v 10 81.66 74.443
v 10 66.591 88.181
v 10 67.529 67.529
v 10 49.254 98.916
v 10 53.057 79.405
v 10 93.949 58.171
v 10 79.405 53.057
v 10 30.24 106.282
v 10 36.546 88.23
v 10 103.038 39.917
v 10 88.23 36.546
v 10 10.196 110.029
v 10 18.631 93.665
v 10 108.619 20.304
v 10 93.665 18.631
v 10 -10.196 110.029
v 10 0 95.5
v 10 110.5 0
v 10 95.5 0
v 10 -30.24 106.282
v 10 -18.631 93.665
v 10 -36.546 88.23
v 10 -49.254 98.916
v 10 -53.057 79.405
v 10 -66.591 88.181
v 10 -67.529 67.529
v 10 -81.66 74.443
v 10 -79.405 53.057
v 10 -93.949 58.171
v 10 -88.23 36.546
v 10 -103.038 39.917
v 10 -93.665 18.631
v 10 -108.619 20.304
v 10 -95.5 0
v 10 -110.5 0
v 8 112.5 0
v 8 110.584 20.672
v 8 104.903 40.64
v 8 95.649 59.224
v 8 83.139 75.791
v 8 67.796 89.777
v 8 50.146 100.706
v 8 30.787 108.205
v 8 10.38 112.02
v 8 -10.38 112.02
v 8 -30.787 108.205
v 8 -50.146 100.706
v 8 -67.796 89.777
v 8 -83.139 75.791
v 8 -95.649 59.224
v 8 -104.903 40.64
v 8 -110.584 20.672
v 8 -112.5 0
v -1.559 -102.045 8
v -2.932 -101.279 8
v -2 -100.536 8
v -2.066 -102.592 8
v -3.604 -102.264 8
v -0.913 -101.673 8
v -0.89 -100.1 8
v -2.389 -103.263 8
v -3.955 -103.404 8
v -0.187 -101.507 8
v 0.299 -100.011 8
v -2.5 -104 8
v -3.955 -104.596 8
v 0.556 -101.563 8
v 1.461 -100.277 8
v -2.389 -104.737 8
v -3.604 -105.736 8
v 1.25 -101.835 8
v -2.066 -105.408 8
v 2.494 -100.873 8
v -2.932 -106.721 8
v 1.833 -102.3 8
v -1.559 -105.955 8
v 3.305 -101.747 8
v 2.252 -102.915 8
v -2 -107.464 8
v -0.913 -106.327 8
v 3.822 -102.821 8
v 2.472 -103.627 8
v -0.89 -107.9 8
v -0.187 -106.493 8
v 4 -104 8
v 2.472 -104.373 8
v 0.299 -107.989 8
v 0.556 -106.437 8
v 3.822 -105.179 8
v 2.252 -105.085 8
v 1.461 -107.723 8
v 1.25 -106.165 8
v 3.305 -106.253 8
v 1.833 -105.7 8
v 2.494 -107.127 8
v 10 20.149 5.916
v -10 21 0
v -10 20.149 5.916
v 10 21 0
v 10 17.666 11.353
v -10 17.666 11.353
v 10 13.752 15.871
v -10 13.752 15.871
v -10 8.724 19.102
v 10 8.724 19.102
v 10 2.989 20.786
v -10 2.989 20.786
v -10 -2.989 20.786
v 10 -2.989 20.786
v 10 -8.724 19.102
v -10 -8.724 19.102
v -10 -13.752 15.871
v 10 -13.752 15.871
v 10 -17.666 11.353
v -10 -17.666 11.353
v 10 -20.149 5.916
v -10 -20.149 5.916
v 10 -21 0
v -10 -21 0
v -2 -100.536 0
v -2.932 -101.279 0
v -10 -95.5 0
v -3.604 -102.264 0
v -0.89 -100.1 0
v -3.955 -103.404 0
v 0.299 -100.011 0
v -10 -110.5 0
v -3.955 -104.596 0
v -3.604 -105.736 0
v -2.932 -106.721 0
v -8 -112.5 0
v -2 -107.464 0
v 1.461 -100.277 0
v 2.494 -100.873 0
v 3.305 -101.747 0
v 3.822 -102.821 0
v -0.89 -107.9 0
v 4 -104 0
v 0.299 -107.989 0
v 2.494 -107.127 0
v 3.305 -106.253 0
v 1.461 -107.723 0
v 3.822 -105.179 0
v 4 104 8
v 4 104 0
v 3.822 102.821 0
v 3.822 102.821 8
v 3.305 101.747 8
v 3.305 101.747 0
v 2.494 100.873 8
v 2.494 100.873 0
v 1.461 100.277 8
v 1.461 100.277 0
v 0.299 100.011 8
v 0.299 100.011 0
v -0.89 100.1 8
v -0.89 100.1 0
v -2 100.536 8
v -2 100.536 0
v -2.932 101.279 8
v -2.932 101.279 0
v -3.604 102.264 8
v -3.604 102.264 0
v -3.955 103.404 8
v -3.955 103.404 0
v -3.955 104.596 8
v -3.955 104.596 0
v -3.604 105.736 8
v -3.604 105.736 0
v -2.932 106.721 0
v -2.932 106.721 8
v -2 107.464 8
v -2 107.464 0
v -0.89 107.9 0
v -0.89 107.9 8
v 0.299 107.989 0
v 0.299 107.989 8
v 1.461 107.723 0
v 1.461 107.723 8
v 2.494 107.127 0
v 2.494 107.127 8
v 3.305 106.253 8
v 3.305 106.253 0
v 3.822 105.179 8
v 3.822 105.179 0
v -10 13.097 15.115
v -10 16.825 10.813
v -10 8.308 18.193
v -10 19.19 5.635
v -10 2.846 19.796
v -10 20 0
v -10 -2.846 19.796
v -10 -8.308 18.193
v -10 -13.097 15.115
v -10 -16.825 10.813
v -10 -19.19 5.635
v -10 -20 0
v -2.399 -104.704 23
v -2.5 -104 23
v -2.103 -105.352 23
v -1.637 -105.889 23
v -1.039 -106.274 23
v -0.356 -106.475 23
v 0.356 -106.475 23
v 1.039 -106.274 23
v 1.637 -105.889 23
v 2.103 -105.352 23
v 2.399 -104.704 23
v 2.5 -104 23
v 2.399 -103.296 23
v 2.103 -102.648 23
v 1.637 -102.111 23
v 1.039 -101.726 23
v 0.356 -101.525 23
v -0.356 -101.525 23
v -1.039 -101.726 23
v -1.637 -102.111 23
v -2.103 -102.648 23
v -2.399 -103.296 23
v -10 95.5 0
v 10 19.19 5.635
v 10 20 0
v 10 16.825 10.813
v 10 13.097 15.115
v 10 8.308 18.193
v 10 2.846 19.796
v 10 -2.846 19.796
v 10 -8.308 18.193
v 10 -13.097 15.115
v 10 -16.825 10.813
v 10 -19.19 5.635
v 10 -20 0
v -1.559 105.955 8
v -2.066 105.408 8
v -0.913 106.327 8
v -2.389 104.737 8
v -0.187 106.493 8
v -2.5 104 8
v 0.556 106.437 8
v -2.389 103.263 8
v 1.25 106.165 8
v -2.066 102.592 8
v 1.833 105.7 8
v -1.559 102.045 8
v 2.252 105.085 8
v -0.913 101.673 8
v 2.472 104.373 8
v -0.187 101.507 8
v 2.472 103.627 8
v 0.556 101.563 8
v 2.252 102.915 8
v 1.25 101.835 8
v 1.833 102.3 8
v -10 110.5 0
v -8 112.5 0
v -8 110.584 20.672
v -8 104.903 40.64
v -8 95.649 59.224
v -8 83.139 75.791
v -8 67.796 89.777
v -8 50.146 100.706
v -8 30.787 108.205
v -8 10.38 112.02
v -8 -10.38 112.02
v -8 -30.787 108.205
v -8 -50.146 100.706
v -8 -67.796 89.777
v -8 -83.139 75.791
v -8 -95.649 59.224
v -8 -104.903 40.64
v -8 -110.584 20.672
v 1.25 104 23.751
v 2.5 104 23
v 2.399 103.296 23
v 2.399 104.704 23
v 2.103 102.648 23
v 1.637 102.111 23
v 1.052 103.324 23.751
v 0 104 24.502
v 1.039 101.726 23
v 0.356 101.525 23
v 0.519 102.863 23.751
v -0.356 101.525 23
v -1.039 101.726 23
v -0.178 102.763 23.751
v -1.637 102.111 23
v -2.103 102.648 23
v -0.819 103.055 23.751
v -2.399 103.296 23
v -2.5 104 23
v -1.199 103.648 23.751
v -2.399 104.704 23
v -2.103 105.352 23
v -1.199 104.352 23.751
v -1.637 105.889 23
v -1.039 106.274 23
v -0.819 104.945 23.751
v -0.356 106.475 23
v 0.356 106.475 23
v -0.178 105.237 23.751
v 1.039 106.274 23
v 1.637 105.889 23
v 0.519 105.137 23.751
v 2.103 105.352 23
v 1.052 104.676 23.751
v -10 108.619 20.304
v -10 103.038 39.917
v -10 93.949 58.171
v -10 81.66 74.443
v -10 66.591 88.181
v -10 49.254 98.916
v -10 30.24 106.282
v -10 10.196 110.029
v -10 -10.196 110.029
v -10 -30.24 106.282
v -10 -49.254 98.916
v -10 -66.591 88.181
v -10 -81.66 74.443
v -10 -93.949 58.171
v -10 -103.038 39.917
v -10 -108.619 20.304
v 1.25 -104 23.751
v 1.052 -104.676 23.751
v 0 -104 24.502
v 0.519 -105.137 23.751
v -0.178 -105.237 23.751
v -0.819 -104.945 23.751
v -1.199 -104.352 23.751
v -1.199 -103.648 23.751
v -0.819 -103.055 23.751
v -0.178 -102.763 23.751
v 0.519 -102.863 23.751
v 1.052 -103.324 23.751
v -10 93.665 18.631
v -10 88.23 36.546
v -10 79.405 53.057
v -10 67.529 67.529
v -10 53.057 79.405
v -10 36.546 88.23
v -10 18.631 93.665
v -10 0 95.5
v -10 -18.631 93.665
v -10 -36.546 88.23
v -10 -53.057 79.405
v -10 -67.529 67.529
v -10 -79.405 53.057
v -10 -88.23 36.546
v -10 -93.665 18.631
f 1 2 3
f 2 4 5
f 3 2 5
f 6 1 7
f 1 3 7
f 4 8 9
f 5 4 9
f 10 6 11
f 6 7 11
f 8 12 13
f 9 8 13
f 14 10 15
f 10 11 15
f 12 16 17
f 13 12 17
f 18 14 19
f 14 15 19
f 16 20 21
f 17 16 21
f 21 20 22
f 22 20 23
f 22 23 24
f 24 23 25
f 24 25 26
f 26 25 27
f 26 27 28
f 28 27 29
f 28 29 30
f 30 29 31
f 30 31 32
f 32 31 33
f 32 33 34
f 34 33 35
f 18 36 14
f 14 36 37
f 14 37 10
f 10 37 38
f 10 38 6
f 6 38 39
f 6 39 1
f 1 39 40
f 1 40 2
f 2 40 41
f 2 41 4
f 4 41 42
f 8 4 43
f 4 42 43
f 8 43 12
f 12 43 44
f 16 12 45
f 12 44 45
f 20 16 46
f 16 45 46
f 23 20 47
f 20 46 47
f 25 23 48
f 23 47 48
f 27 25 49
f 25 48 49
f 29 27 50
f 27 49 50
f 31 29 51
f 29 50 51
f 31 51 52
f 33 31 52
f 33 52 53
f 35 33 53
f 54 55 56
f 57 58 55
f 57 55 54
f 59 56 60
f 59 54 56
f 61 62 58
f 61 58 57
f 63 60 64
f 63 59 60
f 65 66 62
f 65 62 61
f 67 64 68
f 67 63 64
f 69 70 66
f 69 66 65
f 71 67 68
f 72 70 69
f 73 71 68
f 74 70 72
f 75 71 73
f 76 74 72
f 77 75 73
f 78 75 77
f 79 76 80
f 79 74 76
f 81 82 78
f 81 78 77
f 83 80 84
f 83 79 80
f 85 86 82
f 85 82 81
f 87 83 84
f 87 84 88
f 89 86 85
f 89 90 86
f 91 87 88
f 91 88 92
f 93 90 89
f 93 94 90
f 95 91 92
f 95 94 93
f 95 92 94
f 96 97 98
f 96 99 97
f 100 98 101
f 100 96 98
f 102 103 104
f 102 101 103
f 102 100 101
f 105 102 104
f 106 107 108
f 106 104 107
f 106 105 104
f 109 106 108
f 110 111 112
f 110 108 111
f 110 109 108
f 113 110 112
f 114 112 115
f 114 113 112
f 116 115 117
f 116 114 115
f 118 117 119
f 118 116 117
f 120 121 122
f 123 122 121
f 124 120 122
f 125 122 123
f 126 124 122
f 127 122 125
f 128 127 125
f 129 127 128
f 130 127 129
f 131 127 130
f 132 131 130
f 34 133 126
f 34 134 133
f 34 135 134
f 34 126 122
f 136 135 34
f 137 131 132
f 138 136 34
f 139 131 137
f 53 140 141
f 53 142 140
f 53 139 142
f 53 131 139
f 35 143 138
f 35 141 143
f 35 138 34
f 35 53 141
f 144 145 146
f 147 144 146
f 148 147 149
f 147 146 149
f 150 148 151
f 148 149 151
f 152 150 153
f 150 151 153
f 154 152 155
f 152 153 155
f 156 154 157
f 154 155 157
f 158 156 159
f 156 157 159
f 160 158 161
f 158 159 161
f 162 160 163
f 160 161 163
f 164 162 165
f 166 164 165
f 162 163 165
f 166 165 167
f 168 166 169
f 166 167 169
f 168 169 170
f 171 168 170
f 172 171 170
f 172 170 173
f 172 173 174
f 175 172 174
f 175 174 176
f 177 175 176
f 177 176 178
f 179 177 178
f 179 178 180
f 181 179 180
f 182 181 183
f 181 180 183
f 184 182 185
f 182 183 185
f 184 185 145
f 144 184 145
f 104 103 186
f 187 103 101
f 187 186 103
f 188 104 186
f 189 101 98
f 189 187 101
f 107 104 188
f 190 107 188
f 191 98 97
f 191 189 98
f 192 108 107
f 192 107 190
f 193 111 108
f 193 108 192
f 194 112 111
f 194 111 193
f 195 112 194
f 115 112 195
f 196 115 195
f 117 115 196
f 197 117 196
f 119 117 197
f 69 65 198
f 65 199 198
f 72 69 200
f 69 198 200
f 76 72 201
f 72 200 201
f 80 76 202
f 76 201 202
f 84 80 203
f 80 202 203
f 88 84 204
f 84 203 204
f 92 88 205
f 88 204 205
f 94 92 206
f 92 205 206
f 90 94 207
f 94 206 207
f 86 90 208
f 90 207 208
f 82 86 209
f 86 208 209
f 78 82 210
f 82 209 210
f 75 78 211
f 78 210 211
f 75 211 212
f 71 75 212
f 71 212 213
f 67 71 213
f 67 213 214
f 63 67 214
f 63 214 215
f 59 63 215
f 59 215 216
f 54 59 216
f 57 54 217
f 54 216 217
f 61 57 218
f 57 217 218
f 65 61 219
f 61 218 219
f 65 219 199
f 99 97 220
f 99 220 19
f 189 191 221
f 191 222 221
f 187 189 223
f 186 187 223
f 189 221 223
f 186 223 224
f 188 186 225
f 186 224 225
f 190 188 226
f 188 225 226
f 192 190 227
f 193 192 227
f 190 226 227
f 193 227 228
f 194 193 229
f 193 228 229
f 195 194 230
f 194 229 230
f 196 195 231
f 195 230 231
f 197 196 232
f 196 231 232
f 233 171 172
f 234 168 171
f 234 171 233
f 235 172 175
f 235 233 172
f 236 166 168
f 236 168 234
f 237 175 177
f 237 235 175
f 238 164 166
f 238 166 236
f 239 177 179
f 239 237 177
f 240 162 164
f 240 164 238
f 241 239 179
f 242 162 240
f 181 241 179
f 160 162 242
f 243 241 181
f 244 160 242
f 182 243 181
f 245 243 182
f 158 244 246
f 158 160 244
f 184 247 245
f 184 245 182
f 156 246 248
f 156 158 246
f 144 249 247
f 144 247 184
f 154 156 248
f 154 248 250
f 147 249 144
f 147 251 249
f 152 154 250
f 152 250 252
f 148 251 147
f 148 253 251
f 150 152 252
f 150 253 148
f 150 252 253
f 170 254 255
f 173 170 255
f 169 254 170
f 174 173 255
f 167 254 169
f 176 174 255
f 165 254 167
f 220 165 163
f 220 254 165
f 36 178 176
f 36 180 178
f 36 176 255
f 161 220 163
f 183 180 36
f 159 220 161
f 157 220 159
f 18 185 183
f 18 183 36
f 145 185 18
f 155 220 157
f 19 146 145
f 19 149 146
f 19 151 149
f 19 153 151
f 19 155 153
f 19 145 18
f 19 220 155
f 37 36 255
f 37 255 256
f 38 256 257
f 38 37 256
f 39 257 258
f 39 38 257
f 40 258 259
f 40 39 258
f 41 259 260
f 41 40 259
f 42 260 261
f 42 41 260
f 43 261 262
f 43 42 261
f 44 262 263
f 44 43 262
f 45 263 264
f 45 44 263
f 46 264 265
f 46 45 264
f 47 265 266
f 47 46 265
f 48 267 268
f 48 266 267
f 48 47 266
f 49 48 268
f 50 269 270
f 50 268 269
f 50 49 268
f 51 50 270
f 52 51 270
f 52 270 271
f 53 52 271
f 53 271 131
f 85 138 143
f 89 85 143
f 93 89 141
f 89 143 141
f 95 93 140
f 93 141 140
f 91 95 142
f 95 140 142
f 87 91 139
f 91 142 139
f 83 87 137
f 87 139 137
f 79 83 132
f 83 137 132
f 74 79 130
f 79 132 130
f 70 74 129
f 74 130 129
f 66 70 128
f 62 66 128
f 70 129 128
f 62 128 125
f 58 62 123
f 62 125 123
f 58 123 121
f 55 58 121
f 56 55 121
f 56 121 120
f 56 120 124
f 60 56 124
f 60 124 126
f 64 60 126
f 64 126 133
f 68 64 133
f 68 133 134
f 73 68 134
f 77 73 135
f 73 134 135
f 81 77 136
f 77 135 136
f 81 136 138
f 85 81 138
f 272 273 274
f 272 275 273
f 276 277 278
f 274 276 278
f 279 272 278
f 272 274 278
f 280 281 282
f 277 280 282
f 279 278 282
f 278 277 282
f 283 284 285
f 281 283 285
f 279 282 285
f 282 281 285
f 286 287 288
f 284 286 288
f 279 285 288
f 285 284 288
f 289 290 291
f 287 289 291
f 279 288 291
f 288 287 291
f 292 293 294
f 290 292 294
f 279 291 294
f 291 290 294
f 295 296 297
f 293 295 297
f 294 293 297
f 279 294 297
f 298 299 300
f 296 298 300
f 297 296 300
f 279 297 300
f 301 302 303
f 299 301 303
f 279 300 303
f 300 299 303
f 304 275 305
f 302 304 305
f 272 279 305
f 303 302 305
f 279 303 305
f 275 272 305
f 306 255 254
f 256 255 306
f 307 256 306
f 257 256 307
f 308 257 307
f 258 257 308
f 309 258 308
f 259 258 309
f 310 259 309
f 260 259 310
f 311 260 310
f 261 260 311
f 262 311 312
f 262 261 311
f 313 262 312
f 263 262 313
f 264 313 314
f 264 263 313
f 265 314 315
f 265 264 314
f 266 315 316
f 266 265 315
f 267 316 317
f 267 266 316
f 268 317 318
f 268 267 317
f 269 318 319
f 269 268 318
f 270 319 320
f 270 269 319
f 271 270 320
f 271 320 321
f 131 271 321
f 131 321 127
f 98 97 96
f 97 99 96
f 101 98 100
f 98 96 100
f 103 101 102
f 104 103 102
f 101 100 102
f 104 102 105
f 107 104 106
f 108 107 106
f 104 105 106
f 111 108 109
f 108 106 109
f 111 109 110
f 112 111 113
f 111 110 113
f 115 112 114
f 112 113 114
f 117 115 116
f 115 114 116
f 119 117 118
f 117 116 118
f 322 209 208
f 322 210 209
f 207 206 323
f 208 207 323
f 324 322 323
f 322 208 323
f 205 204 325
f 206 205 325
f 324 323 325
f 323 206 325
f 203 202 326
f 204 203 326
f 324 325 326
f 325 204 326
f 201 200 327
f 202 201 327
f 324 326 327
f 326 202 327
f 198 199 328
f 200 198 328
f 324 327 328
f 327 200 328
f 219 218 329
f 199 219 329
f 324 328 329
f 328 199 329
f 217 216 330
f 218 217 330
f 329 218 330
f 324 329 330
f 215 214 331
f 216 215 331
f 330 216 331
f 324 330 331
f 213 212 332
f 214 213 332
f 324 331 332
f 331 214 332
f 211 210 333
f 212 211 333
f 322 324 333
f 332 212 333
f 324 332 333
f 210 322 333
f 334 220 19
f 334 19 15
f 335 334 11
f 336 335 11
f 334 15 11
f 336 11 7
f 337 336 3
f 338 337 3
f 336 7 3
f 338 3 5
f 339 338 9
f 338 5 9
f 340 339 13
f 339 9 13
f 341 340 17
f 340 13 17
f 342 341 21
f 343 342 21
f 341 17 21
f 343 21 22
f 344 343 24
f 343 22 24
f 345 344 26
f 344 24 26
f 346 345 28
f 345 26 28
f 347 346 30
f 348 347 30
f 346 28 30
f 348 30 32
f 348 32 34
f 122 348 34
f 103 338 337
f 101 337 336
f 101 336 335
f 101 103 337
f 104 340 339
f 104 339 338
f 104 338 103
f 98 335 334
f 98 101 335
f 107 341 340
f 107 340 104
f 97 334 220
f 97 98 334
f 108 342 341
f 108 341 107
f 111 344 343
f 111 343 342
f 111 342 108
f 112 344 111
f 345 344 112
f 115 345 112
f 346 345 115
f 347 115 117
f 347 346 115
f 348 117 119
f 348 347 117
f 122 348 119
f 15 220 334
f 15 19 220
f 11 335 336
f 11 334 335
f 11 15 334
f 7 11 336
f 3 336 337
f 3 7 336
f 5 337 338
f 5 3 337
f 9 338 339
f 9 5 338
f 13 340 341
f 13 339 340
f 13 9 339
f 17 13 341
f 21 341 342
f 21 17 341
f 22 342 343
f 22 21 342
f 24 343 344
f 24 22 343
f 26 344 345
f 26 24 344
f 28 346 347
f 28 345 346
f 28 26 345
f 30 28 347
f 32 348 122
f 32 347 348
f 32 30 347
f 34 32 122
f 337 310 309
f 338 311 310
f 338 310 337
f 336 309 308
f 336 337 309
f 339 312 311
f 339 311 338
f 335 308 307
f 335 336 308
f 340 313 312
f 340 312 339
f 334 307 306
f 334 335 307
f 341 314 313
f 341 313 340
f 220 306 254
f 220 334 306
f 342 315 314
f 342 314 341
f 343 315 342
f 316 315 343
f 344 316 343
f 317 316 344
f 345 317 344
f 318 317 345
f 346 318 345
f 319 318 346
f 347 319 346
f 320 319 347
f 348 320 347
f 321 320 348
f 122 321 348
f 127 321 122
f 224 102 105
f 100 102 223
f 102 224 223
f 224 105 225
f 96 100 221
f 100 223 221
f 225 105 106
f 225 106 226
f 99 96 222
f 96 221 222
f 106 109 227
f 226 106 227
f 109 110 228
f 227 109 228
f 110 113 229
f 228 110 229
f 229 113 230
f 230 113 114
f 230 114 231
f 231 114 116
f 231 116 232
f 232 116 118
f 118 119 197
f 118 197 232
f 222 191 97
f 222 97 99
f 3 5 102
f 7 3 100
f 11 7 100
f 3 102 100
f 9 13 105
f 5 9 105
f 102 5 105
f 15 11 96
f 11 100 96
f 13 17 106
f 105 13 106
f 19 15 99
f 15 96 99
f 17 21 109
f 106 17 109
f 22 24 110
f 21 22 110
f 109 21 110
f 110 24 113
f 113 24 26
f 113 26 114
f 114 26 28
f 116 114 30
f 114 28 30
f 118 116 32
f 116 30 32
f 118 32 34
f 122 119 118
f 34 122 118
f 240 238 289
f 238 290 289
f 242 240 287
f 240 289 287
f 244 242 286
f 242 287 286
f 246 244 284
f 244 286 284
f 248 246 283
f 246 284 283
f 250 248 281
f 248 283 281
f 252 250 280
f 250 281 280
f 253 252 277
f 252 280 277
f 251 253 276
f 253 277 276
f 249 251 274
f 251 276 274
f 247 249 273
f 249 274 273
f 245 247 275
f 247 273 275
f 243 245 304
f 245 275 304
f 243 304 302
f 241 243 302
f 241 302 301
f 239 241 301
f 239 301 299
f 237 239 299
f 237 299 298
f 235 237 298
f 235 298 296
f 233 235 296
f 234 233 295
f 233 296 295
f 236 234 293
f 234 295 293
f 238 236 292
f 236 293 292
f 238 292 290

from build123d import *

# Parameters (mm, degrees)
F0_W           = 20
F0_H           = 1
F2_W           = 20
F2_H           = 74.5
F4_W           = 20
F4_H           = 17
F8_SIZE        = 2
F9_W           = 20
F9_H           = 115
F10_DEPTH      = 112.501
F10_DEPTH_BACK = 112.501
F11_R          = 4
F12_DEPTH      = 8
F14_D          = 5
F14_DEPTH      = 15
F14_TIP        = 1.5021515476


with BuildPart() as f1:
    # F0 (on Front) → F1 (revolve)
    with BuildSketch(Plane.XZ):
        with Locations((0, 20.5)):
            Rectangle(F0_W, F0_H)
    revolve(axis=Axis((0, 0, 0), (1, 0, 0)))


with BuildPart() as f3:
    # F2 (on Front) → F3 (revolve)
    with BuildSketch(Plane.XZ):
        with Locations((0, 58.25)):
            Rectangle(F2_W, F2_H)
    revolve(axis=Axis((0, 0, 0), (1, 0, 0)))


with BuildPart() as f5:
    # F4 (on Front) → F5 (revolve)
    with BuildSketch(Plane.XZ):
        with Locations((0, 104)):
            Rectangle(F4_W, F4_H)
    revolve(axis=Axis((0, 0, 0), (1, 0, 0)))

    # F8
    f8_edges = [f5.edges().sort_by_distance(p)[0] for p in [
        (10, 0, -112.5),
        (-10, 0, -112.5),
    ]]
    chamfer(f8_edges, length=F8_SIZE)


with BuildPart() as f10_tool:
    # F9 (on Front) → F10 (new body, two sides)
    with BuildSketch(Plane.XZ) as f10_sk:
        with Locations((0, -57.5)):
            Rectangle(F9_W, F9_H)
    extrude(amount=F10_DEPTH)
    extrude(f10_sk.sketch, amount=-F10_DEPTH_BACK)


with BuildPart() as f1_1:
    add(f1.part)

    # F10: cut by f10_tool
    add(f10_tool.part, mode=Mode.SUBTRACT)


with BuildPart() as f3_1:
    add(f3.part)

    # F10: cut by f10_tool
    add(f10_tool.part, mode=Mode.SUBTRACT)


with BuildPart() as f5_1:
    add(f5.part)

    # F10: cut by f10_tool
    add(f10_tool.part, mode=Mode.SUBTRACT)

    # F11 (on face) → F12 (cut)
    with BuildSketch(Plane(origin=(0, 0, 0), x_dir=(1, 0, 0), z_dir=(0, 0, -1))):
        with Locations((0, 104)):
            Circle(F11_R)
        with Locations((0, -104)):
            Circle(F11_R)
    extrude(amount=-F12_DEPTH, mode=Mode.SUBTRACT)

    # F14
    with Locations(Plane(origin=(0, 0, 8), x_dir=(1, 0, 0), z_dir=(0, 0, -1))):
        with Locations((0, 104), (0, -104)):
            Hole(F14_D / 2, depth=F14_DEPTH)
            with Locations((0, 0, -(F14_DEPTH + F14_TIP / 2))):  # 118° drill point
                Cone(0, F14_D / 2, F14_TIP, mode=Mode.SUBTRACT)


solid = Compound([f1_1.part, f3_1.part, f5_1.part])
